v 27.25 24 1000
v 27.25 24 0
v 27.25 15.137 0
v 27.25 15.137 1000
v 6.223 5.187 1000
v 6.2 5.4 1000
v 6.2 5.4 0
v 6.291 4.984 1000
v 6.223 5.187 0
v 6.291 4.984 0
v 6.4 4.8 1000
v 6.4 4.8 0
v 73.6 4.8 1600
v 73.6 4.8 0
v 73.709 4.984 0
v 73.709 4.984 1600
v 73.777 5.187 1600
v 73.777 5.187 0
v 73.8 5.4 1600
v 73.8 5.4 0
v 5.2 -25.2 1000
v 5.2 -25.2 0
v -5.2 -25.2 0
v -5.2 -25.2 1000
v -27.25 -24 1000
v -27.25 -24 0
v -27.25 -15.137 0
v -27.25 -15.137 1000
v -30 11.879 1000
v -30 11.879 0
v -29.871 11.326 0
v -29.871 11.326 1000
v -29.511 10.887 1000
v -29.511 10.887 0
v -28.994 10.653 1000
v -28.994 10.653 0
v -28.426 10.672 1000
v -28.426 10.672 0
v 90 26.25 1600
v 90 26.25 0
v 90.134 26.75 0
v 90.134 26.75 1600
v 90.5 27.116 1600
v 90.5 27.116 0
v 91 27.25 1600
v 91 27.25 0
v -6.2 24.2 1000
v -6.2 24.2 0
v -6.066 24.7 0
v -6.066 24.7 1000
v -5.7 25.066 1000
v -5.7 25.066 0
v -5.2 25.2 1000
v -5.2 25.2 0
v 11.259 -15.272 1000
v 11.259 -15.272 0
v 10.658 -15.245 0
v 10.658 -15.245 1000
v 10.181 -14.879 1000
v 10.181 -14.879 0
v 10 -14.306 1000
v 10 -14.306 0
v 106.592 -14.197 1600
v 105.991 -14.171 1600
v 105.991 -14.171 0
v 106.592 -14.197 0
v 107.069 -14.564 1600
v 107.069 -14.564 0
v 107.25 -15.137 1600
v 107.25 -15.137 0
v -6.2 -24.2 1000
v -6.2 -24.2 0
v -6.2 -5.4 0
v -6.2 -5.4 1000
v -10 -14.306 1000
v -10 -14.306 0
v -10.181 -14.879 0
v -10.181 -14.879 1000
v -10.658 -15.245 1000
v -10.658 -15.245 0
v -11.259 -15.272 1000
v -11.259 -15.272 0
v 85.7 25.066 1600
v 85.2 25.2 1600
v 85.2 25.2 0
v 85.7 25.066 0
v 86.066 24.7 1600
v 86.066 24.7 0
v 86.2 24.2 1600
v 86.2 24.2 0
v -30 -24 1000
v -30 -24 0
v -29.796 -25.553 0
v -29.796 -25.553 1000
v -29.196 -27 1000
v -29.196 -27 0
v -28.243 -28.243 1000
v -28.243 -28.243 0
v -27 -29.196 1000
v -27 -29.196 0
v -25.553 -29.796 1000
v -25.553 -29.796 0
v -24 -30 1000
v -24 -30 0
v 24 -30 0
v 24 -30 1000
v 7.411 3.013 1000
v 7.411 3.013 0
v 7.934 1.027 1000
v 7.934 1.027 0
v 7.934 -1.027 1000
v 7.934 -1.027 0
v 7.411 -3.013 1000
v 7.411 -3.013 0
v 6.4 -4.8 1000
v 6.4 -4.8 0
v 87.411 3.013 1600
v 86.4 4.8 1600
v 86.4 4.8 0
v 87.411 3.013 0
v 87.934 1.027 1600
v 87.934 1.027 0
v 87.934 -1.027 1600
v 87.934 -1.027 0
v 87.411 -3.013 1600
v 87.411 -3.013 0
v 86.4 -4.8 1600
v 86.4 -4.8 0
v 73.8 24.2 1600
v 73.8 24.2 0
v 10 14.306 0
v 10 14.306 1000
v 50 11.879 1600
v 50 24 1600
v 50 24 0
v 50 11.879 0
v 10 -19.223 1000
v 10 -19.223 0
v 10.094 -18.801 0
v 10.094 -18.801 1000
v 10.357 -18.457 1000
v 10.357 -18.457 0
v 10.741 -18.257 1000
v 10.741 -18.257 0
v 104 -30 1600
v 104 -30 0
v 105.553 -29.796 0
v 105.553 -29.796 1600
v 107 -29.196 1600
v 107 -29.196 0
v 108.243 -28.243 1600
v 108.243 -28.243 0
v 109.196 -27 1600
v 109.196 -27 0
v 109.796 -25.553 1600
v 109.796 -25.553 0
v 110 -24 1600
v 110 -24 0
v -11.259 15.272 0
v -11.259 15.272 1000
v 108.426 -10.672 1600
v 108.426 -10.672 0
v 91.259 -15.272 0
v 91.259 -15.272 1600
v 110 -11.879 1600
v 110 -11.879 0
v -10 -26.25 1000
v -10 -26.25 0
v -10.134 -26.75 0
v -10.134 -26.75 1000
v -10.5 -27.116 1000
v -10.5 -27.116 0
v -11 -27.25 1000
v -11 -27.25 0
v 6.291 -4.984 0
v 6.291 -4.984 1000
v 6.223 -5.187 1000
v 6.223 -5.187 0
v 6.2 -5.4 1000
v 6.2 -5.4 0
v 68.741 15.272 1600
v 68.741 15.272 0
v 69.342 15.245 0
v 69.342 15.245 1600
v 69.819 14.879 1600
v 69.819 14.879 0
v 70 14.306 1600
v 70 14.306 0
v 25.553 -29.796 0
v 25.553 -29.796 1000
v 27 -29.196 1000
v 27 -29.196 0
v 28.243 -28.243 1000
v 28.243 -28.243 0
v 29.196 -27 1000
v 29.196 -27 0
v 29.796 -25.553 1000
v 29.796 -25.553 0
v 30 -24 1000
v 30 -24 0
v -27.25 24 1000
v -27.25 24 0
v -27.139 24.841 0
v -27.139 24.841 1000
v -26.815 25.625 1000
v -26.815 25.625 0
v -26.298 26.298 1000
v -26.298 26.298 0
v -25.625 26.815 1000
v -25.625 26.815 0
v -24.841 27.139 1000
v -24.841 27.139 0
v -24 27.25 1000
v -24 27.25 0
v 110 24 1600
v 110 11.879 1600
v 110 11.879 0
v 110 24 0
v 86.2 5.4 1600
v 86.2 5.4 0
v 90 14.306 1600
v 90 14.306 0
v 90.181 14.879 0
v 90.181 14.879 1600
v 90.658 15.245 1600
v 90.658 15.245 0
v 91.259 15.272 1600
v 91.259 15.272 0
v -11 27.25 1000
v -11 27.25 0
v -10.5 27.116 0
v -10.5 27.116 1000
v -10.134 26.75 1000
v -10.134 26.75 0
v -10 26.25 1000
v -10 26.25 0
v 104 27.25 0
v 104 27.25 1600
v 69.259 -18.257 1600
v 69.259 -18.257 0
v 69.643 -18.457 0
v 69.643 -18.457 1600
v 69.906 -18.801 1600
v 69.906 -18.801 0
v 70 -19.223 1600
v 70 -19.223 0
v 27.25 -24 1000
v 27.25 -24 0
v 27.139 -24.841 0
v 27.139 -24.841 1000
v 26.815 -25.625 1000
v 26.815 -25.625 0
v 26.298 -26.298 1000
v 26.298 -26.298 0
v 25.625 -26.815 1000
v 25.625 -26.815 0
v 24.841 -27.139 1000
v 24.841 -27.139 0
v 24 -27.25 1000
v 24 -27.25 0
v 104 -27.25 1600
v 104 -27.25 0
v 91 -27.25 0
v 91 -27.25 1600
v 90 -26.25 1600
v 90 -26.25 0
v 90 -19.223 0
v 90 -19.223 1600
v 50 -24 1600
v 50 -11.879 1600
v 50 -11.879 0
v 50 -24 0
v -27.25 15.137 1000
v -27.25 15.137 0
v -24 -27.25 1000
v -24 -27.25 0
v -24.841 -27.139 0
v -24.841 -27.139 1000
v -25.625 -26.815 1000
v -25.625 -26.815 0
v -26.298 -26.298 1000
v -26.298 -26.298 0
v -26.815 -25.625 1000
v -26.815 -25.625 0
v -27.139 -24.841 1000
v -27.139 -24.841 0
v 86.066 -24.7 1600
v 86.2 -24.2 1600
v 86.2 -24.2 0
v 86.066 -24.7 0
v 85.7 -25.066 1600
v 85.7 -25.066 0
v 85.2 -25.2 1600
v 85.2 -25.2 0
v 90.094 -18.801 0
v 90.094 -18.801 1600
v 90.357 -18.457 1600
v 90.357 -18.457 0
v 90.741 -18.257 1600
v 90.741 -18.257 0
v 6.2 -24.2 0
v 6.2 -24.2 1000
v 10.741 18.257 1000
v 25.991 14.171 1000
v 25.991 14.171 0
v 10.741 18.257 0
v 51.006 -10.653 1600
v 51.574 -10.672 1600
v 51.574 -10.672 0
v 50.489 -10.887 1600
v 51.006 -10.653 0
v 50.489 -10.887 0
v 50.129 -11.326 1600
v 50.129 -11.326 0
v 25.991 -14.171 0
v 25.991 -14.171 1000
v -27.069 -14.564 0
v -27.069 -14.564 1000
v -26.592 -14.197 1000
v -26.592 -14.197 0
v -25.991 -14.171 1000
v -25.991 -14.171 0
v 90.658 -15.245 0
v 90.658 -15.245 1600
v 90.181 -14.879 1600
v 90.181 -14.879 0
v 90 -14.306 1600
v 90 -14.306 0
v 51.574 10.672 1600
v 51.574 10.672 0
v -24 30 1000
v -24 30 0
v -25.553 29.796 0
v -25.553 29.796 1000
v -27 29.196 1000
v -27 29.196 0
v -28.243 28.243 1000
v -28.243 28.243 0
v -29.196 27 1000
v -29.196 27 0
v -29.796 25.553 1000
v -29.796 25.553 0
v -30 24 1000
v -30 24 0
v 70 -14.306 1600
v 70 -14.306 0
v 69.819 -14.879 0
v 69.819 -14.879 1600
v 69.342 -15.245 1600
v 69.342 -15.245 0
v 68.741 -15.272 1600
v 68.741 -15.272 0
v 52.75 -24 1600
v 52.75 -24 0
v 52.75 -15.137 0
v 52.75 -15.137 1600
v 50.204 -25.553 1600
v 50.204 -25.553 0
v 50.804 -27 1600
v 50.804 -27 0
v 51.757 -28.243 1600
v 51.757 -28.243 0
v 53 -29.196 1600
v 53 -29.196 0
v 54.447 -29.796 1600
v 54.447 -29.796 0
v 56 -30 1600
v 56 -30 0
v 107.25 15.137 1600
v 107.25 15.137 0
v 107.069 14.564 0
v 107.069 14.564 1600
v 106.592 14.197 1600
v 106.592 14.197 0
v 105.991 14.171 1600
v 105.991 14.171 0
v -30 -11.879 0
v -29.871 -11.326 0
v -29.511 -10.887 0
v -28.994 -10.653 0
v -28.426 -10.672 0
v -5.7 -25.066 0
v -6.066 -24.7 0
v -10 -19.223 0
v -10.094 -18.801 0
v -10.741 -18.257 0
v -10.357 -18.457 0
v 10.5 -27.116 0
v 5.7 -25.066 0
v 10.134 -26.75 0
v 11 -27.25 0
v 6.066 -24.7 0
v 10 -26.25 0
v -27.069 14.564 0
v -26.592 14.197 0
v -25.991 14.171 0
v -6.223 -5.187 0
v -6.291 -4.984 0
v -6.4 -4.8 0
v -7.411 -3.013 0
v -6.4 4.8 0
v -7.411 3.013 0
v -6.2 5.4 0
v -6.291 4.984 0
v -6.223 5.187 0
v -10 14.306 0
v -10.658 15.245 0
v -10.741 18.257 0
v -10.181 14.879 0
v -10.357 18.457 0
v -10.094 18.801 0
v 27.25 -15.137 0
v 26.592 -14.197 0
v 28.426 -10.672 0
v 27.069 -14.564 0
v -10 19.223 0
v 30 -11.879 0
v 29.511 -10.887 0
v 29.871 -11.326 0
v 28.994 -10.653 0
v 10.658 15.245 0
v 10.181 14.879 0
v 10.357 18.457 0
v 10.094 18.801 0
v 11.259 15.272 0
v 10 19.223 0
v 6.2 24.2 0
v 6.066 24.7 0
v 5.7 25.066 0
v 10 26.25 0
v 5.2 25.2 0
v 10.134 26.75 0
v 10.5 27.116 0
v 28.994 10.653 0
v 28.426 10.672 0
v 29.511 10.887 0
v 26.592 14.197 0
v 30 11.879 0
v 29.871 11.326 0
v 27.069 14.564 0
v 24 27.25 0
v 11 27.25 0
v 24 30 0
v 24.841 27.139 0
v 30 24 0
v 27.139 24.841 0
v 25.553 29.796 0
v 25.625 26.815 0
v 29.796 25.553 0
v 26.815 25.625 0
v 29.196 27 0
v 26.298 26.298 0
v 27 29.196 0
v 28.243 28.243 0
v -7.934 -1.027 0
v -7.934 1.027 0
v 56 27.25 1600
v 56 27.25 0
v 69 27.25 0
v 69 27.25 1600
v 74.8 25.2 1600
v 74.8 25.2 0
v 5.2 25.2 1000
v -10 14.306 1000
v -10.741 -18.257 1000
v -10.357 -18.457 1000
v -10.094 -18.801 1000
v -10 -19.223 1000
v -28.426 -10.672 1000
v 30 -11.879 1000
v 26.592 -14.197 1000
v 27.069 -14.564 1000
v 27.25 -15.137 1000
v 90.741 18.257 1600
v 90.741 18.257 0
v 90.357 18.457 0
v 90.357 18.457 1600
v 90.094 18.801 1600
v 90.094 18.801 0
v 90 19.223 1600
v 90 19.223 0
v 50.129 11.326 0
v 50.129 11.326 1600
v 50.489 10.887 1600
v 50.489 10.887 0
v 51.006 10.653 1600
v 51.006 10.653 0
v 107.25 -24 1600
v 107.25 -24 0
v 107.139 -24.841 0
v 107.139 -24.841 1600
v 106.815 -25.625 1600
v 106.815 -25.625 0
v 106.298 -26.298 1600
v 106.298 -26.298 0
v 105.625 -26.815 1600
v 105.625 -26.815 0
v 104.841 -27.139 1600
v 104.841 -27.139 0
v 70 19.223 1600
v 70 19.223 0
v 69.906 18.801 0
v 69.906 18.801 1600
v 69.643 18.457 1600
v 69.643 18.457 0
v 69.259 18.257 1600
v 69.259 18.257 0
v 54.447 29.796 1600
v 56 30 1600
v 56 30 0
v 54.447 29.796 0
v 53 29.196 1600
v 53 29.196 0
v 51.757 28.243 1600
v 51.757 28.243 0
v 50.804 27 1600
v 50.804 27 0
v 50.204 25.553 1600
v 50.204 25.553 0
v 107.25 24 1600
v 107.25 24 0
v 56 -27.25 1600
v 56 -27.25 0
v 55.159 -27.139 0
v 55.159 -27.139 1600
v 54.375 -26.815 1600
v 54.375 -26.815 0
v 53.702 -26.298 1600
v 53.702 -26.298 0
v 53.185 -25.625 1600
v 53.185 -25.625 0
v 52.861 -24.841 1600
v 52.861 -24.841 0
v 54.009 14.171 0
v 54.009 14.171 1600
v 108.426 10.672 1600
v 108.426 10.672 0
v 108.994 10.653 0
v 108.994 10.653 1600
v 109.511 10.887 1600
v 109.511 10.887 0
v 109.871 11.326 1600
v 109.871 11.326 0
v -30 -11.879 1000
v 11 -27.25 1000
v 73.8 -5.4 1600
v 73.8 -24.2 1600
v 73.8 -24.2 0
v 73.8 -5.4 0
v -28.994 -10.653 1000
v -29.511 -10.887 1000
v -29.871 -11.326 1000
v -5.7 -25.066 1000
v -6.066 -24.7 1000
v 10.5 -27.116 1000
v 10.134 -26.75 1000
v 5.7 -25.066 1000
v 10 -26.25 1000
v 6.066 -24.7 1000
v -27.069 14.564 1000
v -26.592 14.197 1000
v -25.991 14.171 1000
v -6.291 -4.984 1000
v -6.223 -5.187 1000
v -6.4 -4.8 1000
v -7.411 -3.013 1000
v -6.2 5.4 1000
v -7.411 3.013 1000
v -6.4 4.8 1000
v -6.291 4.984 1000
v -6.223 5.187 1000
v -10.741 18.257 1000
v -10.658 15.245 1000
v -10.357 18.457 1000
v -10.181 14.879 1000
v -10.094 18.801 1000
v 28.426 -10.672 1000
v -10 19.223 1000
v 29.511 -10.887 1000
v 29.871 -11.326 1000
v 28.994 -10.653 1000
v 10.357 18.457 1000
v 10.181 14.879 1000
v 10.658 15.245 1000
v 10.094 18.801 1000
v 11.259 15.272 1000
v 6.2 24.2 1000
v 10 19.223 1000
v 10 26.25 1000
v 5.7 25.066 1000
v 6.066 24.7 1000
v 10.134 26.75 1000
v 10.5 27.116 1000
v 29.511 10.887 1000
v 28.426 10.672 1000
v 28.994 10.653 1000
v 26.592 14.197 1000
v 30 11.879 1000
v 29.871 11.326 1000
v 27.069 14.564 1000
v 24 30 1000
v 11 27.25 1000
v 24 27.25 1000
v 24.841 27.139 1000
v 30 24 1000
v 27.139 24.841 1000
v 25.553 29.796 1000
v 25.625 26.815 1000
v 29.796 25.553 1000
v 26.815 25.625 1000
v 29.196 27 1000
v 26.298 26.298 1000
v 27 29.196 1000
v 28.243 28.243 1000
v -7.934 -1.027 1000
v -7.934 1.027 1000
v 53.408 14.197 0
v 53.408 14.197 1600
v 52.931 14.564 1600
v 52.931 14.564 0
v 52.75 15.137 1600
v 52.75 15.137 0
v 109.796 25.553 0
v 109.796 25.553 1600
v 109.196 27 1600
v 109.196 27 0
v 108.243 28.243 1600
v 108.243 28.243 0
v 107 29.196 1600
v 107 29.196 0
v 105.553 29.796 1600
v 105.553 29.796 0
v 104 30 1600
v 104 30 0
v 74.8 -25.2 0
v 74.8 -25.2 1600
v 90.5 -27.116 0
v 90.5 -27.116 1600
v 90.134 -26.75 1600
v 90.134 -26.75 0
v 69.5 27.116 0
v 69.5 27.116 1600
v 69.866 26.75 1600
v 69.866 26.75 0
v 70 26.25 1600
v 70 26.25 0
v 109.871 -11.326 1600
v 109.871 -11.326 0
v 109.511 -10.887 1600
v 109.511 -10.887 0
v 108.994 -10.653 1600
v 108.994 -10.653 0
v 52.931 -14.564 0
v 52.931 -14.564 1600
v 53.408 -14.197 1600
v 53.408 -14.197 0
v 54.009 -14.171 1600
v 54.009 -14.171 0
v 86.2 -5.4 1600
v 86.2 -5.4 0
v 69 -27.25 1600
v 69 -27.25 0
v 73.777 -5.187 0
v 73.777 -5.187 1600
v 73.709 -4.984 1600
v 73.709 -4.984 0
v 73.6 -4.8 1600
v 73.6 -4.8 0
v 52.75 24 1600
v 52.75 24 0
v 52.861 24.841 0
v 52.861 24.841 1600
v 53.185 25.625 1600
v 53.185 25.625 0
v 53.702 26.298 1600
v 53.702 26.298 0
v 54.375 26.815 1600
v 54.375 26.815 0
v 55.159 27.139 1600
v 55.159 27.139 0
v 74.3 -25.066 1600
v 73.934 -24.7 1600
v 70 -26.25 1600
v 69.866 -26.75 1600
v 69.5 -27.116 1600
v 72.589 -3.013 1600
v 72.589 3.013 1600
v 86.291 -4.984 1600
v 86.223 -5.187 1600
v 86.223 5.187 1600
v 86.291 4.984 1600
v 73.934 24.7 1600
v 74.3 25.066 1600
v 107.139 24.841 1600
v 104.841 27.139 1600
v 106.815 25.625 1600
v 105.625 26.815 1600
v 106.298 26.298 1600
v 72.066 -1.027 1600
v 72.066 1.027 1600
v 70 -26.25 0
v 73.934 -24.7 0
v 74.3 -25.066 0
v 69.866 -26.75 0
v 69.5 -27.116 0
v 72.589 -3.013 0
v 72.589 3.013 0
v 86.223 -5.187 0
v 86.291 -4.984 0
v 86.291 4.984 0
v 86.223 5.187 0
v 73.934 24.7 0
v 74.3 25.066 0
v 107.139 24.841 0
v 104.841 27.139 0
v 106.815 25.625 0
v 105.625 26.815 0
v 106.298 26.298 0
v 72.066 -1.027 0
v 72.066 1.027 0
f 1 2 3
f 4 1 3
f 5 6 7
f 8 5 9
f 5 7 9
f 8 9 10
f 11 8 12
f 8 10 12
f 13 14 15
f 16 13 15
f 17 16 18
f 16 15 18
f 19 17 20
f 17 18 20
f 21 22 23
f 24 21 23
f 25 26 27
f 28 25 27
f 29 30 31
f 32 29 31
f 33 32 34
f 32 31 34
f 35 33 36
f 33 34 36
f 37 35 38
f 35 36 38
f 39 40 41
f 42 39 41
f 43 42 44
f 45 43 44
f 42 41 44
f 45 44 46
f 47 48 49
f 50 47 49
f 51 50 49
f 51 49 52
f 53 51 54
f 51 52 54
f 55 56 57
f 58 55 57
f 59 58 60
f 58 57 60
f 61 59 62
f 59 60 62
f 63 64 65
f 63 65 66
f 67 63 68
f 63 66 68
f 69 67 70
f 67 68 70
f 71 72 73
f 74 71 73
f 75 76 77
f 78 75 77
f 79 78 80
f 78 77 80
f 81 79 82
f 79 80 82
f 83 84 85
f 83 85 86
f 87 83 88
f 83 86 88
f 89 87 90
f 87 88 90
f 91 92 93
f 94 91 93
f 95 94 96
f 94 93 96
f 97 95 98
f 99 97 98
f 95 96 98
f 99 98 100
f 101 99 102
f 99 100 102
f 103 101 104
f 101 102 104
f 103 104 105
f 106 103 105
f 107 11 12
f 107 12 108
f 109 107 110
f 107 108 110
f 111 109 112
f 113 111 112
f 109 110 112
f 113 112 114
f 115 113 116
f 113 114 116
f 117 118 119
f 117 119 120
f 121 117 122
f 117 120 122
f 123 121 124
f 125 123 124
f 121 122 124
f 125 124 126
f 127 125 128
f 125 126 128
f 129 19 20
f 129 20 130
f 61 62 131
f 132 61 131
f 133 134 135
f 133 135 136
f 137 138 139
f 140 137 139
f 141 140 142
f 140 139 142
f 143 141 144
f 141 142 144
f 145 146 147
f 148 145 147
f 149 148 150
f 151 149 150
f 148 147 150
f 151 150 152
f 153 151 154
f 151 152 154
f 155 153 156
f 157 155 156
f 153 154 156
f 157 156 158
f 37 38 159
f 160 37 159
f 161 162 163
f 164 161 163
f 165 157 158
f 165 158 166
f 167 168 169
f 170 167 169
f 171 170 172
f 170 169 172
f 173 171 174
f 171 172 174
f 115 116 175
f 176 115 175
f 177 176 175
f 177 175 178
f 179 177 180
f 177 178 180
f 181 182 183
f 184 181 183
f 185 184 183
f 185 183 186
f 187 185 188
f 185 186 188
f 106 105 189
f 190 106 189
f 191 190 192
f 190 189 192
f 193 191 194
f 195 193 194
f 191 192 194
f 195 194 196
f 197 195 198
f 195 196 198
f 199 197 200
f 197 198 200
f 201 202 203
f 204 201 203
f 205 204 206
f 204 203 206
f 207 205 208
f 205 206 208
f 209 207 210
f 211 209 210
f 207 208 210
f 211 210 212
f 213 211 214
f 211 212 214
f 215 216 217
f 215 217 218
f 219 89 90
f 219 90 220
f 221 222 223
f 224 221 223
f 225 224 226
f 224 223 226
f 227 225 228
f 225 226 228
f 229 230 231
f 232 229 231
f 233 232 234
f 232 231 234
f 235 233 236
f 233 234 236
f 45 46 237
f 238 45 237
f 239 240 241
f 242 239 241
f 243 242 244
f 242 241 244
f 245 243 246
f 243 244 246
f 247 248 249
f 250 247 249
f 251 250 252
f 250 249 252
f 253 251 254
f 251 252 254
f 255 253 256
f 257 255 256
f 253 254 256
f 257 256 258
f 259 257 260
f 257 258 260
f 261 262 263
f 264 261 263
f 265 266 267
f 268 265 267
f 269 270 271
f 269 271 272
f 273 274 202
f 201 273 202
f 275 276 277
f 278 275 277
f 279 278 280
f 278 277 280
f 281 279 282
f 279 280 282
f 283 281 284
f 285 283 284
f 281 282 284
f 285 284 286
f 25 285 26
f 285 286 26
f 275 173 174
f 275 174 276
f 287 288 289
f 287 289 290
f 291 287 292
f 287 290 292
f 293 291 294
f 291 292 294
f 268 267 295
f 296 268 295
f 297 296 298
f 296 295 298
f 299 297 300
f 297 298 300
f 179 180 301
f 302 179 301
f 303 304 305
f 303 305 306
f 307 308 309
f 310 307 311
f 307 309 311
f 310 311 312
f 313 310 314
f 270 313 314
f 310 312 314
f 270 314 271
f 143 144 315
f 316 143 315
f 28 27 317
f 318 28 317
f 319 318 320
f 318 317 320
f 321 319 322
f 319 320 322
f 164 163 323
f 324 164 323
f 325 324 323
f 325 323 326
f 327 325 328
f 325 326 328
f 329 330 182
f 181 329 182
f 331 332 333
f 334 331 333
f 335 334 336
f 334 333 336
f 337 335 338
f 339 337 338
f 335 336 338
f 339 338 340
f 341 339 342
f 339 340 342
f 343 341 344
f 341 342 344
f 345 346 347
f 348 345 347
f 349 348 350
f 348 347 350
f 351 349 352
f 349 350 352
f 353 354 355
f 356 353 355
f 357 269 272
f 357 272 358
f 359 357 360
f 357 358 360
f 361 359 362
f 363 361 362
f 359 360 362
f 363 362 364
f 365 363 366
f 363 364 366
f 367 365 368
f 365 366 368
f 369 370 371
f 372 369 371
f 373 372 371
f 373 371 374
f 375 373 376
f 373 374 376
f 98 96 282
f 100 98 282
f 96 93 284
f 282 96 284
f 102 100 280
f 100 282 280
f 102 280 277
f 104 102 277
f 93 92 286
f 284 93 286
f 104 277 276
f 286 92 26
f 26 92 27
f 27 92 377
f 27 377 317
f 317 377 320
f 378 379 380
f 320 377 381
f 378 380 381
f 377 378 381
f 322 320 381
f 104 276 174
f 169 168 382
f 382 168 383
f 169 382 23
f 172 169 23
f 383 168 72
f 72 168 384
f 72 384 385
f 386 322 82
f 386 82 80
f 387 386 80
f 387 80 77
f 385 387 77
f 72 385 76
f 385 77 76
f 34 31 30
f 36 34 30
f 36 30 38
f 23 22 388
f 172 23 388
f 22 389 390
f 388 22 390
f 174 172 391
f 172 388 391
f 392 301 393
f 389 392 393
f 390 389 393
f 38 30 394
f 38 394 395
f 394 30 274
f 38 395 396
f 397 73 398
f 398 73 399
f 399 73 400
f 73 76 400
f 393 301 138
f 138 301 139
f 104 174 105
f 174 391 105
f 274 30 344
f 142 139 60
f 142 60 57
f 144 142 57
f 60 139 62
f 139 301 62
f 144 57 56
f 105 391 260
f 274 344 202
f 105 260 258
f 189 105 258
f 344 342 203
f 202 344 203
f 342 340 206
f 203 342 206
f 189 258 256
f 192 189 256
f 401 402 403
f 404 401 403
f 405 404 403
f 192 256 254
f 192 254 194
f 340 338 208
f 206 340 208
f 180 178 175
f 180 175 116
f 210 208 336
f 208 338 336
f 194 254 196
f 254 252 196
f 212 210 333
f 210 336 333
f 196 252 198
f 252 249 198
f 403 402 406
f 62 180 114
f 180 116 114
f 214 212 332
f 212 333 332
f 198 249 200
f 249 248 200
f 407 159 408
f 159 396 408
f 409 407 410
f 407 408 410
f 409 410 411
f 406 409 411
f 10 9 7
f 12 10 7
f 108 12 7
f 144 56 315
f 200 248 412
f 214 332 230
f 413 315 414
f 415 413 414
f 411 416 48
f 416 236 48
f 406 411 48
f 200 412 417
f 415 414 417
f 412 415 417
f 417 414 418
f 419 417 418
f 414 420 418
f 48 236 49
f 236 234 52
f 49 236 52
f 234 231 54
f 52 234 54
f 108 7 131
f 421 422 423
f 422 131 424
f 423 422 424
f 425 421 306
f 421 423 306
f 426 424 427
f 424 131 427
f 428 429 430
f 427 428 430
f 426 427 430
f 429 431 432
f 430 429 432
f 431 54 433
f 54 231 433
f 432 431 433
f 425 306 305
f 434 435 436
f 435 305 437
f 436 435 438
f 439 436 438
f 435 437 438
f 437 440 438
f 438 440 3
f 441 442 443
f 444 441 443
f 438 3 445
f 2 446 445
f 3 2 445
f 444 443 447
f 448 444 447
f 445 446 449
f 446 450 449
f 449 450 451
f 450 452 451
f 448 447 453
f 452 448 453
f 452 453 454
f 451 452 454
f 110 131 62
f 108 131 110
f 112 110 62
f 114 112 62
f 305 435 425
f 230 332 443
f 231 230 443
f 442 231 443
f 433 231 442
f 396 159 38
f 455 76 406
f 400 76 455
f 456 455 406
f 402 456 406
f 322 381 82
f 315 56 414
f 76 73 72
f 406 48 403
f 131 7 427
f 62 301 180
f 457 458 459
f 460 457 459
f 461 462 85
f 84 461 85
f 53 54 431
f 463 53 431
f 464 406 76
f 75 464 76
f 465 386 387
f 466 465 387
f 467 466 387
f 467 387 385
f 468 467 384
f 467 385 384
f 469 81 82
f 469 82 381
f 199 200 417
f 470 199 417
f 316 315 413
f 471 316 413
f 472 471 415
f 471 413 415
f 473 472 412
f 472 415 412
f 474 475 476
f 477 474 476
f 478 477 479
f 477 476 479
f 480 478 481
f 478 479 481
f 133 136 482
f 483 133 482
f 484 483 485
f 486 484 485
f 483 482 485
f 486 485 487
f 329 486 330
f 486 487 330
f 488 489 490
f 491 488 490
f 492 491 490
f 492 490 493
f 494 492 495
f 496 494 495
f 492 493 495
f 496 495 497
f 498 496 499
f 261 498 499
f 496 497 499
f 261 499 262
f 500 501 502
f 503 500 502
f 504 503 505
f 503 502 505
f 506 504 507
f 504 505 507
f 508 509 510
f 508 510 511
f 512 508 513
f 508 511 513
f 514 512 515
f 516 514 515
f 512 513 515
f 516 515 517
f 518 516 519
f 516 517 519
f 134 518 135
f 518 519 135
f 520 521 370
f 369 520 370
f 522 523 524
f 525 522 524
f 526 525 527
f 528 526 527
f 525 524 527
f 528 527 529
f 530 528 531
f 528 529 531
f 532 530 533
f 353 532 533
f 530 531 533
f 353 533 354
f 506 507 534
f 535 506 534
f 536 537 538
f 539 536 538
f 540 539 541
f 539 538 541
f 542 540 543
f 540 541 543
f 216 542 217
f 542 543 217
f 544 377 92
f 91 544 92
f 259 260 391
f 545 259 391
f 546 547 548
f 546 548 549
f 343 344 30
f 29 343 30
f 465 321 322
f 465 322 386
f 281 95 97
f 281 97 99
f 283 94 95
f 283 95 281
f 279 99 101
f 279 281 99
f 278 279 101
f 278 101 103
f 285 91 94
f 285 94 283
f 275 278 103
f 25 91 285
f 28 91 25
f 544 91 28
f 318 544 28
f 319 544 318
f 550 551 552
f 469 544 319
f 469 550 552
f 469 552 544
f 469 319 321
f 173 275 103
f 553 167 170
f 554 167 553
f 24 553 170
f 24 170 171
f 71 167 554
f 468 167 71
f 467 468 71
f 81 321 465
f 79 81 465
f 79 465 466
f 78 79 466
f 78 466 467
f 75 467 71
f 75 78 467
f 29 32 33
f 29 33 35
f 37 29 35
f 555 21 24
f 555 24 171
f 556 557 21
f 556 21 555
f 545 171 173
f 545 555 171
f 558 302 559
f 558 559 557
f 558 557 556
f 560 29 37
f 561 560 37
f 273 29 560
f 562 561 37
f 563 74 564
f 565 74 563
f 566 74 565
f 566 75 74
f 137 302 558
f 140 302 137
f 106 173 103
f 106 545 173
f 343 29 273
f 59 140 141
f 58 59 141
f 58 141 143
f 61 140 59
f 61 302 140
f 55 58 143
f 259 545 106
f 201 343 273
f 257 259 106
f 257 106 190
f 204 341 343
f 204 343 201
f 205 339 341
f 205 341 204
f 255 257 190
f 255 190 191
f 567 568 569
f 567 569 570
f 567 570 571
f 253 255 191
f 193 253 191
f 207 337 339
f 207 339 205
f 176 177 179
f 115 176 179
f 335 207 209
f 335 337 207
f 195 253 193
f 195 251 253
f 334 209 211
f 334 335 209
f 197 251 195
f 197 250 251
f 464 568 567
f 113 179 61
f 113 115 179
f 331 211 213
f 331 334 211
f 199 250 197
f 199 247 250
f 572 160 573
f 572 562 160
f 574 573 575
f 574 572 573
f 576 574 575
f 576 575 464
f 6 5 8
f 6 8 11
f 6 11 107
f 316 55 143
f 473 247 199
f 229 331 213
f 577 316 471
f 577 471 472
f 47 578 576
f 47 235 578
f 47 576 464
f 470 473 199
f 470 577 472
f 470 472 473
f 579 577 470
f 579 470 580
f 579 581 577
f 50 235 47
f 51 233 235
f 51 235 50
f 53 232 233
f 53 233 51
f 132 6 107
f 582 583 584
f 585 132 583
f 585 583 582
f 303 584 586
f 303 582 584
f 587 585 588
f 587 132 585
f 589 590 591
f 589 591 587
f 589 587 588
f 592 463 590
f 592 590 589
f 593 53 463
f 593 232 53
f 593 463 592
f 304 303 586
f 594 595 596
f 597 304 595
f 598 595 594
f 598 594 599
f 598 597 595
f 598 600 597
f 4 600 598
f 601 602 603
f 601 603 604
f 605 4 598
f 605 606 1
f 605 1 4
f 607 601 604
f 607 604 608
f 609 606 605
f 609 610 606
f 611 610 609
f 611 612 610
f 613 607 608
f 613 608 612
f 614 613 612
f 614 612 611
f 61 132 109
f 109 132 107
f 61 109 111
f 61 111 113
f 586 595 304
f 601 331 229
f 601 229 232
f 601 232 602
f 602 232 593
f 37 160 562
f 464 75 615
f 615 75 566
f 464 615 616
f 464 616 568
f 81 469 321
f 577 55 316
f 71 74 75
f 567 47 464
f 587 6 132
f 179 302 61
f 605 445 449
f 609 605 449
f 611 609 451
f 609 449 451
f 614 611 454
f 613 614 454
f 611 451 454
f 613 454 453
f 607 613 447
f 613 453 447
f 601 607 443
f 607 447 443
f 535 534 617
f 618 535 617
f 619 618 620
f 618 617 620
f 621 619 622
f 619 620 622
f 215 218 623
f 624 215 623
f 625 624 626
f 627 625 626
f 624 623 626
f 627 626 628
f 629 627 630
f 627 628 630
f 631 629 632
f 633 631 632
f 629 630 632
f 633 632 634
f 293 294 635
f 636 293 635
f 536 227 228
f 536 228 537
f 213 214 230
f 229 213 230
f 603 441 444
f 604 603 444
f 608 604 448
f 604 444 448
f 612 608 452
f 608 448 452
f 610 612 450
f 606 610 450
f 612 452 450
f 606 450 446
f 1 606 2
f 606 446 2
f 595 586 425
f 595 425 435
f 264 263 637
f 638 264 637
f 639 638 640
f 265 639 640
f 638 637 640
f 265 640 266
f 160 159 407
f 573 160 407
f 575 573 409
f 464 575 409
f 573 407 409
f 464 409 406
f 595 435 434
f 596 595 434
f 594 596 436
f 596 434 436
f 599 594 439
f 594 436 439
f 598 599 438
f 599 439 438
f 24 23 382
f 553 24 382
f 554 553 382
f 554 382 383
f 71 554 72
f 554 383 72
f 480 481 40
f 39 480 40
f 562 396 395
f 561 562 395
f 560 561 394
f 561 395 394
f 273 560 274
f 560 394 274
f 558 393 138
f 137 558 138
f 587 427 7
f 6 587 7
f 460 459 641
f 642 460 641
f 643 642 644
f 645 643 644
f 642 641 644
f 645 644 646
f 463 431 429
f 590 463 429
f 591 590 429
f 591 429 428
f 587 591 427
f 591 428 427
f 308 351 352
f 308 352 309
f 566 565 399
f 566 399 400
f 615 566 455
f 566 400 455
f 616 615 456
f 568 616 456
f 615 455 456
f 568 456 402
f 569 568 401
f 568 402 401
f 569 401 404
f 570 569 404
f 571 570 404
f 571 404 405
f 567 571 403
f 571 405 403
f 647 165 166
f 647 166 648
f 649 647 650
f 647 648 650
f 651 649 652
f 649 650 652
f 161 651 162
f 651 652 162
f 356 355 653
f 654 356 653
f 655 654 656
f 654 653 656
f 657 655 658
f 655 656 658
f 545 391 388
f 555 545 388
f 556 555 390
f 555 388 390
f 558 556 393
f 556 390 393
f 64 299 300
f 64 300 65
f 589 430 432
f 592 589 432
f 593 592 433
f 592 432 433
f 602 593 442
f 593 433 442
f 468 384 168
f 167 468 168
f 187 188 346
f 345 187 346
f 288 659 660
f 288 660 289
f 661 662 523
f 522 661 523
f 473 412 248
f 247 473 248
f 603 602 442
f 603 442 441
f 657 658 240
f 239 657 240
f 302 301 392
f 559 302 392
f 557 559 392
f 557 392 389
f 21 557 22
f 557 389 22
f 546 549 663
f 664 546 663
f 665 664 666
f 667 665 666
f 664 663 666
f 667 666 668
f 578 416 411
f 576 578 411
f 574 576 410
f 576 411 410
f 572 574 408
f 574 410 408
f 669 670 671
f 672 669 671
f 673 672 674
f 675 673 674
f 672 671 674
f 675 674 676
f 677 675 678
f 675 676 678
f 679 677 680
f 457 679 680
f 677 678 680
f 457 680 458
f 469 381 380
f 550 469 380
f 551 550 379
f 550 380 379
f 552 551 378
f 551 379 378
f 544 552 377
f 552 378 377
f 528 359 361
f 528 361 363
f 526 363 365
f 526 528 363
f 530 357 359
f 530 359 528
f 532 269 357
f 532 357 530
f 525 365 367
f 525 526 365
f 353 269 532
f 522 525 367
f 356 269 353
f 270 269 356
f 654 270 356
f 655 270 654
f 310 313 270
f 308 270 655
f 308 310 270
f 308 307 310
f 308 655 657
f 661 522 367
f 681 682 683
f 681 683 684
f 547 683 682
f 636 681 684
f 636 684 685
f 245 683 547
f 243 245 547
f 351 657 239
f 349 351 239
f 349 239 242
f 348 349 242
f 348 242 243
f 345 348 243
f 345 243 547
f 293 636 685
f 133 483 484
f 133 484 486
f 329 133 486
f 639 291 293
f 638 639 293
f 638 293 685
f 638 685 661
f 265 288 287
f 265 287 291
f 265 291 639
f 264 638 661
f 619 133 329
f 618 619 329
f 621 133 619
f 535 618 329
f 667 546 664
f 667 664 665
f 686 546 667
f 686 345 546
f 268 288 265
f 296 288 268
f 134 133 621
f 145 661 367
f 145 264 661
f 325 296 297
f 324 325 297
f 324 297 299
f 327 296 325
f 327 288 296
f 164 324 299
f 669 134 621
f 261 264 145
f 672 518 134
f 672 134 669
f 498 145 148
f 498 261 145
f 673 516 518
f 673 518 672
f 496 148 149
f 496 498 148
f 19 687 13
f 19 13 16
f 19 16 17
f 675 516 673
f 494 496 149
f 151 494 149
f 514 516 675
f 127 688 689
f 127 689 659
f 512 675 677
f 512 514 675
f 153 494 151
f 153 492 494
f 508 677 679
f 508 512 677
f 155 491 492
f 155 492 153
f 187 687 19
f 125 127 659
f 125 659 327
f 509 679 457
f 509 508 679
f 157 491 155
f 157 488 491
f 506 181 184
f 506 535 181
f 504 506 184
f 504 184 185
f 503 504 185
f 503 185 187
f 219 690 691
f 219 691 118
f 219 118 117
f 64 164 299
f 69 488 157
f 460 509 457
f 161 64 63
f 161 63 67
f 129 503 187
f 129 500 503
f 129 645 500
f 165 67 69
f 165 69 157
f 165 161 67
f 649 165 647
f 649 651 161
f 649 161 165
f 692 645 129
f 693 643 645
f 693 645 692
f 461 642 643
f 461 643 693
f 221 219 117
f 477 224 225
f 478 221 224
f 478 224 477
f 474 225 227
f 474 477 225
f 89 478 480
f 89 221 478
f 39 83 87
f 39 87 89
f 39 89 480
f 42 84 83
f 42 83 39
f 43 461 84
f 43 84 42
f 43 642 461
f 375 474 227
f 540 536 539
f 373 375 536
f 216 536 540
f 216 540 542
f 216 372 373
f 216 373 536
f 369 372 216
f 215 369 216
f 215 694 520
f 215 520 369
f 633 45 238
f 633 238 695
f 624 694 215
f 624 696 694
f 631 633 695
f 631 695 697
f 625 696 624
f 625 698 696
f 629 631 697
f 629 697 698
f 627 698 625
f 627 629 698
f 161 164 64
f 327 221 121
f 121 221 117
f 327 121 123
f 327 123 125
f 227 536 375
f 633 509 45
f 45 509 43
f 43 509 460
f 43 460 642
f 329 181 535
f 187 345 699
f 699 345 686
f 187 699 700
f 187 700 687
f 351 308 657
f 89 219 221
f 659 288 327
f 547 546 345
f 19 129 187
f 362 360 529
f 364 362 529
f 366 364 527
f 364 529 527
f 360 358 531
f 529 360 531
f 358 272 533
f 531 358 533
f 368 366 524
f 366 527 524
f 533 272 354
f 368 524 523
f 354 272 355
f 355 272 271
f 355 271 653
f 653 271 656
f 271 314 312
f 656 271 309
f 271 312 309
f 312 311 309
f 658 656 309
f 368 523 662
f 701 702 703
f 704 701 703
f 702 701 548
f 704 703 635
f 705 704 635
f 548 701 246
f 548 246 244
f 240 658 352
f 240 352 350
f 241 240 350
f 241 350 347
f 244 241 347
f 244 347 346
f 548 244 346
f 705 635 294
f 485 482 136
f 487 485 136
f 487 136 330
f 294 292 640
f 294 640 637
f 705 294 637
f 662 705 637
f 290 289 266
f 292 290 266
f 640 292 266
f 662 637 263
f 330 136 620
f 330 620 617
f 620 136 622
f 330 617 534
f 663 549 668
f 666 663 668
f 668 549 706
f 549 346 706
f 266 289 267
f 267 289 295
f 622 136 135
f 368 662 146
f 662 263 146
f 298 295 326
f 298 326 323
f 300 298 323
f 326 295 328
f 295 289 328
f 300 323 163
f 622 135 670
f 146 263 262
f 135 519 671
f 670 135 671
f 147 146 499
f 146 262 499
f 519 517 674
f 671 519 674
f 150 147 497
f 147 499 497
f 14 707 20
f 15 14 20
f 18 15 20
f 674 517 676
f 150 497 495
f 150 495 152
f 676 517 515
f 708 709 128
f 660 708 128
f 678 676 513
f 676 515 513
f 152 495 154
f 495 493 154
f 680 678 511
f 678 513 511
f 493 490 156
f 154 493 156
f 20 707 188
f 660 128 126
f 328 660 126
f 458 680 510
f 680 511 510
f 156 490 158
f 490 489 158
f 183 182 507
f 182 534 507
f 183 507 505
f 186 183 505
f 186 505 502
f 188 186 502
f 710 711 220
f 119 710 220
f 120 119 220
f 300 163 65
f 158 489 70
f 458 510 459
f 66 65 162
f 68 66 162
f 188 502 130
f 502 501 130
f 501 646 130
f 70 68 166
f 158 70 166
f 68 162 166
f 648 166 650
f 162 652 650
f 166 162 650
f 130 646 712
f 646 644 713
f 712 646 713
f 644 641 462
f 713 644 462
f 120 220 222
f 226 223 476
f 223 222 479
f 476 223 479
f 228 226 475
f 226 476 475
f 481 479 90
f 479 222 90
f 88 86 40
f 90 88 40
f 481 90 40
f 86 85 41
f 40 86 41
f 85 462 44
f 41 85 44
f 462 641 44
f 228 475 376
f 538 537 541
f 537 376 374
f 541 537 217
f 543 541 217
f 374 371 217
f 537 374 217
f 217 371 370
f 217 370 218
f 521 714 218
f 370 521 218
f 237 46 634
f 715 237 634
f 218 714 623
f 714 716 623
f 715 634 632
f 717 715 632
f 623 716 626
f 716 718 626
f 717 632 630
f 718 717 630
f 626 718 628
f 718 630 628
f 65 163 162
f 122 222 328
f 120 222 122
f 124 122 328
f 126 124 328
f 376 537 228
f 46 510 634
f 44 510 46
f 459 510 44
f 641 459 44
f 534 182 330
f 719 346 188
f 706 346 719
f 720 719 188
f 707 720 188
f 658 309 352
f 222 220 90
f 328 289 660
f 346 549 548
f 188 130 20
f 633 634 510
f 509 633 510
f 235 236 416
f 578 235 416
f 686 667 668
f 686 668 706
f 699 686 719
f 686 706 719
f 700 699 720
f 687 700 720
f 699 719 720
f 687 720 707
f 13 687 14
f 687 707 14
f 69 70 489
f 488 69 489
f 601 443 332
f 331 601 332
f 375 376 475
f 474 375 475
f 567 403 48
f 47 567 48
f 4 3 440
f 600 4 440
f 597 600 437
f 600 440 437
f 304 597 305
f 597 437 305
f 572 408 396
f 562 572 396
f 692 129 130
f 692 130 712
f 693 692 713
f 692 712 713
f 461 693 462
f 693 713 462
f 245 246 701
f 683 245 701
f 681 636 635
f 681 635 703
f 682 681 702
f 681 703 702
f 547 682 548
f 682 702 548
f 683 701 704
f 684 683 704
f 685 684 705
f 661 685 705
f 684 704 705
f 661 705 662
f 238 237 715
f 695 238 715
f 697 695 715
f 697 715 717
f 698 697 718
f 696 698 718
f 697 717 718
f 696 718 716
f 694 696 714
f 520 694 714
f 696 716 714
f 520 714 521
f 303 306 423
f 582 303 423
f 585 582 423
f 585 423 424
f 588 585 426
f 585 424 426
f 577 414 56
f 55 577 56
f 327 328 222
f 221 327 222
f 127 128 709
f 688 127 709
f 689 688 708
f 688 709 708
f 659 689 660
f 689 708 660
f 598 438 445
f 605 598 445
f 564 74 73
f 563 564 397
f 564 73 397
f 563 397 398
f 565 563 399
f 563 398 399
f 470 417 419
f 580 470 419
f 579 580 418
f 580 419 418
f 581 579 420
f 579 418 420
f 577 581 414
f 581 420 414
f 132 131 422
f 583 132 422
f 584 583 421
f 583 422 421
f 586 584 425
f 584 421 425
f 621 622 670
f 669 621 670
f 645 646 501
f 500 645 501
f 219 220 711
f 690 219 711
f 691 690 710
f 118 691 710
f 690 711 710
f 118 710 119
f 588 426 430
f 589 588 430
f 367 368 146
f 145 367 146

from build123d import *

# Parameters (mm, degrees)
F1_DEPTH = 1000
F2_DEPTH = 1600


# Not quite as in the source:
# - ends of sketch curves that miss each other by under 0.0002 mm in the source are joined


with BuildPart() as f1:
    # F0 (on Top) → F1 (new body)
    with BuildSketch(Plane.XY):
        with BuildLine():
            ThreePointArc((11.2588189596, -15.2716838492), (10.3912385359, -15.0991113133), (10, -14.305758))
            Line((10, -14.305758), (10, 14.305758))
            ThreePointArc((10, 14.305758), (10.3912385359, 15.0991113133), (11.2588189596, 15.2716838492))
            Line((11.2588189596, 15.2716838492), (28.426476, 10.671624))
            ThreePointArc((28.426476, 10.671624), (29.5109517857, 10.8873403242), (30, 11.879032))
            Line((30, 11.879032), (30, 24))
            ThreePointArc((30, 24), (28.2426406871, 28.2426406871), (24, 30))
            Line((24, 30), (-24, 30))
            ThreePointArc((-24, 30), (-28.2426406871, 28.2426406871), (-30, 24))
            Line((-30, 24), (-30, 11.879032))
            ThreePointArc((-30, 11.879032), (-29.5109517857, 10.8873403242), (-28.4264761923, 10.6716247175))
            Line((-28.4264761923, 10.6716247175), (-11.258819, 15.271684))
            ThreePointArc((-11.258819, 15.271684), (-10.3912385359, 15.0991113133), (-10, 14.305758))
            Line((-10, 14.305758), (-10, -14.305758))
            ThreePointArc((-10, -14.305758), (-10.3912385359, -15.0991113133), (-11.2588189596, -15.2716838492))
            Line((-11.2588189596, -15.2716838492), (-28.426476, -10.671624))
            ThreePointArc((-28.426476, -10.671624), (-29.5109517857, -10.8873403242), (-30, -11.879032))
            Line((-30, -11.879032), (-30, -24))
            ThreePointArc((-30, -24), (-28.2426406871, -28.2426406871), (-24, -30))
            Line((-24, -30), (24, -30))
            ThreePointArc((24, -30), (28.2426406871, -28.2426406871), (30, -24))
            Line((30, -24), (30, -11.879032))
            ThreePointArc((30, -11.879032), (29.5109517857, -10.8873403242), (28.4264761923, -10.6716247175))
            Line((28.4264761923, -10.6716247175), (11.2588189596, -15.2716838492))
        make_face()
        with BuildLine():
            Line((-11, -27.25), (-24, -27.25))
            ThreePointArc((-24, -27.25), (-26.2980970389, -26.2980970389), (-27.25, -24))
            Line((-27.25, -24), (-27.25, -15.137095))
            ThreePointArc((-27.25, -15.137095), (-26.8587614641, -14.3437416867), (-25.9911810404, -14.1711691508))
            Line((-25.9911810404, -14.1711691508), (-10.741181, -18.257395))
            ThreePointArc((-10.741181, -18.257395), (-10.2066466079, -18.6145586385), (-10, -19.22332))
            Line((-10, -19.22332), (-10, -26.25))
            ThreePointArc((-10, -26.25), (-10.2928932188, -26.9571067812), (-11, -27.25))
        make_face(mode=Mode.SUBTRACT)
        with BuildLine():
            Line((10.741181, -18.257395), (25.991181, -14.171169))
            ThreePointArc((25.991181, -14.171169), (26.8587614641, -14.3437416867), (27.25, -15.137095))
            Line((27.25, -15.137095), (27.25, -24))
            ThreePointArc((27.25, -24), (26.2980970389, -26.2980970389), (24, -27.25))
            Line((24, -27.25), (11, -27.25))
            ThreePointArc((11, -27.25), (10.2928932188, -26.9571067812), (10, -26.25))
            Line((10, -26.25), (10, -19.22332))
            ThreePointArc((10, -19.22332), (10.2066466079, -18.6145586385), (10.741181, -18.257395))
        make_face(mode=Mode.SUBTRACT)
        with BuildLine():
            Line((5.2, -25.2), (-5.2, -25.2))
            ThreePointArc((-5.2, -25.2), (-5.9071067812, -24.9071067812), (-6.2, -24.2))
            Line((-6.2, -24.2), (-6.2, -5.4))
            ThreePointArc((-6.2, -5.4), (-6.2513167019, -5.083772234), (-6.4, -4.8))
            ThreePointArc((-6.4, -4.8), (-8, 0), (-6.4, 4.8))
            ThreePointArc((-6.4, 4.8), (-6.2513167019, 5.083772234), (-6.2, 5.4))
            Line((-6.2, 5.4), (-6.2, 24.2))
            ThreePointArc((-6.2, 24.2), (-5.9071067812, 24.9071067812), (-5.2, 25.2))
            Line((-5.2, 25.2), (5.2, 25.2))
            ThreePointArc((5.2, 25.2), (5.9071067812, 24.9071067812), (6.2, 24.2))
            Line((6.2, 24.2), (6.2, 5.4))
            ThreePointArc((6.2, 5.4), (6.2513167019, 5.083772234), (6.4, 4.8))
            ThreePointArc((6.4, 4.8), (8, 0), (6.4, -4.8))
            ThreePointArc((6.4, -4.8), (6.2513167019, -5.083772234), (6.2, -5.4))
            Line((6.2, -5.4), (6.2, -24.2))
            ThreePointArc((6.2, -24.2), (5.9071067812, -24.9071067812), (5.2, -25.2))
        make_face(mode=Mode.SUBTRACT)
        with BuildLine():
            Line((-10.741181, 18.257395), (-25.991181, 14.171169))
            ThreePointArc((-25.991181, 14.171169), (-26.8587614641, 14.3437416867), (-27.25, 15.137095))
            Line((-27.25, 15.137095), (-27.25, 24))
            ThreePointArc((-27.25, 24), (-26.2980970389, 26.2980970389), (-24, 27.25))
            Line((-24, 27.25), (-11, 27.25))
            ThreePointArc((-11, 27.25), (-10.2928932188, 26.9571067812), (-10, 26.25))
            Line((-10, 26.25), (-10, 19.22332))
            ThreePointArc((-10, 19.22332), (-10.2066466079, 18.6145586385), (-10.741181, 18.257395))
        make_face(mode=Mode.SUBTRACT)
        with BuildLine():
            Line((11, 27.25), (24, 27.25))
            ThreePointArc((24, 27.25), (26.2980970389, 26.2980970389), (27.25, 24))
            Line((27.25, 24), (27.25, 15.137095))
            ThreePointArc((27.25, 15.137095), (26.8587614641, 14.3437416867), (25.9911810404, 14.1711691508))
            Line((25.9911810404, 14.1711691508), (10.741181, 18.257395))
            ThreePointArc((10.741181, 18.257395), (10.2066466079, 18.6145586385), (10, 19.22332))
            Line((10, 19.22332), (10, 26.25))
            ThreePointArc((10, 26.25), (10.2928932188, 26.9571067812), (11, 27.25))
        make_face(mode=Mode.SUBTRACT)
    extrude(amount=F1_DEPTH)


with BuildPart() as f2:
    # F0 (on Top) → F2 (new body)
    with BuildSketch(Plane.XY):
        with BuildLine():
            ThreePointArc((50, -24), (51.7573593129, -28.2426406871), (56, -30))
            Line((56, -30), (104, -30))
            ThreePointArc((104, -30), (108.2426406871, -28.2426406871), (110, -24))
            Line((110, -24), (110, -11.879032))
            ThreePointArc((110, -11.879032), (109.5109517857, -10.8873403242), (108.4264761923, -10.6716247175))
            Line((108.4264761923, -10.6716247175), (91.258819, -15.271684))
            ThreePointArc((91.258819, -15.271684), (90.3912385359, -15.0991113133), (90, -14.305758))
            Line((90, -14.305758), (90, 14.305758))
            ThreePointArc((90, 14.305758), (90.3912385359, 15.0991113133), (91.2588189596, 15.2716838492))
            Line((91.2588189596, 15.2716838492), (108.426476, 10.671624))
            ThreePointArc((108.426476, 10.671624), (109.5109517857, 10.8873403242), (110, 11.879032))
            Line((110, 11.879032), (110, 24))
            ThreePointArc((110, 24), (108.2426406871, 28.2426406871), (104, 30))
            Line((104, 30), (56, 30))
            ThreePointArc((56, 30), (51.7573593129, 28.2426406871), (50, 24))
            Line((50, 24), (50, 11.879032))
            ThreePointArc((50, 11.879032), (50.4890482143, 10.8873403242), (51.5735238077, 10.6716247175))
            Line((51.5735238077, 10.6716247175), (68.741181, 15.271684))
            ThreePointArc((68.741181, 15.271684), (69.6087614641, 15.0991113133), (70, 14.305758))
            Line((70, 14.305758), (70, -14.305758))
            ThreePointArc((70, -14.305758), (69.6087614641, -15.0991113133), (68.7411810404, -15.2716838492))
            Line((68.7411810404, -15.2716838492), (51.573524, -10.671624))
            ThreePointArc((51.573524, -10.671624), (50.4890482143, -10.8873403242), (50, -11.879032))
            Line((50, -11.879032), (50, -24))
        make_face()
        with BuildLine():
            Line((54.008819, -14.171169), (69.258819, -18.257395))
            ThreePointArc((69.258819, -18.257395), (69.7933533921, -18.6145586385), (70, -19.22332))
            Line((70, -19.22332), (70, -26.25))
            ThreePointArc((70, -26.25), (69.7071067812, -26.9571067812), (69, -27.25))
            Line((69, -27.25), (56, -27.25))
            ThreePointArc((56, -27.25), (53.7019029611, -26.2980970389), (52.75, -24))
            Line((52.75, -24), (52.75, -15.137095))
            ThreePointArc((52.75, -15.137095), (53.1412385359, -14.3437416867), (54.008819, -14.171169))
        make_face(mode=Mode.SUBTRACT)
        with BuildLine():
            Line((104, -27.25), (91, -27.25))
            ThreePointArc((91, -27.25), (90.2928932188, -26.9571067812), (90, -26.25))
            Line((90, -26.25), (90, -19.22332))
            ThreePointArc((90, -19.22332), (90.2066466079, -18.6145586385), (90.7411807904, -18.2573942178))
            Line((90.7411807904, -18.2573942178), (105.991181, -14.171169))
            ThreePointArc((105.991181, -14.171169), (106.8587614641, -14.3437416867), (107.25, -15.137095))
            Line((107.25, -15.137095), (107.25, -24))
            ThreePointArc((107.25, -24), (106.2980970389, -26.2980970389), (104, -27.25))
        make_face(mode=Mode.SUBTRACT)
        with BuildLine():
            Line((86.2, 24.2), (86.2, 5.4))
            ThreePointArc((86.2, 5.4), (86.2513167019, 5.083772234), (86.4, 4.8))
            ThreePointArc((86.4, 4.8), (88, 0), (86.4, -4.8))
            ThreePointArc((86.4, -4.8), (86.2513167019, -5.083772234), (86.2, -5.4))
            Line((86.2, -5.4), (86.2, -24.2))
            ThreePointArc((86.2, -24.2), (85.9071067812, -24.9071067812), (85.2, -25.2))
            Line((85.2, -25.2), (74.8, -25.2))
            ThreePointArc((74.8, -25.2), (74.0928932188, -24.9071067812), (73.8, -24.2))
            Line((73.8, -24.2), (73.8, -5.4))
            ThreePointArc((73.8, -5.4), (73.7486832981, -5.083772234), (73.6, -4.8))
            ThreePointArc((73.6, -4.8), (72, 0), (73.6, 4.8))
            ThreePointArc((73.6, 4.8), (73.7486832981, 5.083772234), (73.8, 5.4))
            Line((73.8, 5.4), (73.8, 24.2))
            ThreePointArc((73.8, 24.2), (74.0928932188, 24.9071067812), (74.8, 25.2))
            Line((74.8, 25.2), (85.2, 25.2))
            ThreePointArc((85.2, 25.2), (85.9071067812, 24.9071067812), (86.2, 24.2))
        make_face(mode=Mode.SUBTRACT)
        with BuildLine():
            Line((69.258819, 18.257395), (54.008819, 14.171169))
            ThreePointArc((54.008819, 14.171169), (53.1412385359, 14.3437416867), (52.75, 15.137095))
            Line((52.75, 15.137095), (52.75, 24))
            ThreePointArc((52.75, 24), (53.7019029611, 26.2980970389), (56, 27.25))
            Line((56, 27.25), (69, 27.25))
            ThreePointArc((69, 27.25), (69.7071067812, 26.9571067812), (70, 26.25))
            Line((70, 26.25), (70, 19.22332))
            ThreePointArc((70, 19.22332), (69.7933533921, 18.6145586385), (69.258819, 18.257395))
        make_face(mode=Mode.SUBTRACT)
        with BuildLine():
            Line((105.991181, 14.171169), (90.741181, 18.257395))
            ThreePointArc((90.741181, 18.257395), (90.2066466079, 18.6145586385), (90, 19.22332))
            Line((90, 19.22332), (90, 26.25))
            ThreePointArc((90, 26.25), (90.2928932188, 26.9571067812), (91, 27.25))
            Line((91, 27.25), (104, 27.25))
            ThreePointArc((104, 27.25), (106.2980970389, 26.2980970389), (107.25, 24))
            Line((107.25, 24), (107.25, 15.137095))
            ThreePointArc((107.25, 15.137095), (106.8587614641, 14.3437416867), (105.991181, 14.171169))
        make_face(mode=Mode.SUBTRACT)
    extrude(amount=F2_DEPTH)


solid = Compound([f1.part, f2.part])
